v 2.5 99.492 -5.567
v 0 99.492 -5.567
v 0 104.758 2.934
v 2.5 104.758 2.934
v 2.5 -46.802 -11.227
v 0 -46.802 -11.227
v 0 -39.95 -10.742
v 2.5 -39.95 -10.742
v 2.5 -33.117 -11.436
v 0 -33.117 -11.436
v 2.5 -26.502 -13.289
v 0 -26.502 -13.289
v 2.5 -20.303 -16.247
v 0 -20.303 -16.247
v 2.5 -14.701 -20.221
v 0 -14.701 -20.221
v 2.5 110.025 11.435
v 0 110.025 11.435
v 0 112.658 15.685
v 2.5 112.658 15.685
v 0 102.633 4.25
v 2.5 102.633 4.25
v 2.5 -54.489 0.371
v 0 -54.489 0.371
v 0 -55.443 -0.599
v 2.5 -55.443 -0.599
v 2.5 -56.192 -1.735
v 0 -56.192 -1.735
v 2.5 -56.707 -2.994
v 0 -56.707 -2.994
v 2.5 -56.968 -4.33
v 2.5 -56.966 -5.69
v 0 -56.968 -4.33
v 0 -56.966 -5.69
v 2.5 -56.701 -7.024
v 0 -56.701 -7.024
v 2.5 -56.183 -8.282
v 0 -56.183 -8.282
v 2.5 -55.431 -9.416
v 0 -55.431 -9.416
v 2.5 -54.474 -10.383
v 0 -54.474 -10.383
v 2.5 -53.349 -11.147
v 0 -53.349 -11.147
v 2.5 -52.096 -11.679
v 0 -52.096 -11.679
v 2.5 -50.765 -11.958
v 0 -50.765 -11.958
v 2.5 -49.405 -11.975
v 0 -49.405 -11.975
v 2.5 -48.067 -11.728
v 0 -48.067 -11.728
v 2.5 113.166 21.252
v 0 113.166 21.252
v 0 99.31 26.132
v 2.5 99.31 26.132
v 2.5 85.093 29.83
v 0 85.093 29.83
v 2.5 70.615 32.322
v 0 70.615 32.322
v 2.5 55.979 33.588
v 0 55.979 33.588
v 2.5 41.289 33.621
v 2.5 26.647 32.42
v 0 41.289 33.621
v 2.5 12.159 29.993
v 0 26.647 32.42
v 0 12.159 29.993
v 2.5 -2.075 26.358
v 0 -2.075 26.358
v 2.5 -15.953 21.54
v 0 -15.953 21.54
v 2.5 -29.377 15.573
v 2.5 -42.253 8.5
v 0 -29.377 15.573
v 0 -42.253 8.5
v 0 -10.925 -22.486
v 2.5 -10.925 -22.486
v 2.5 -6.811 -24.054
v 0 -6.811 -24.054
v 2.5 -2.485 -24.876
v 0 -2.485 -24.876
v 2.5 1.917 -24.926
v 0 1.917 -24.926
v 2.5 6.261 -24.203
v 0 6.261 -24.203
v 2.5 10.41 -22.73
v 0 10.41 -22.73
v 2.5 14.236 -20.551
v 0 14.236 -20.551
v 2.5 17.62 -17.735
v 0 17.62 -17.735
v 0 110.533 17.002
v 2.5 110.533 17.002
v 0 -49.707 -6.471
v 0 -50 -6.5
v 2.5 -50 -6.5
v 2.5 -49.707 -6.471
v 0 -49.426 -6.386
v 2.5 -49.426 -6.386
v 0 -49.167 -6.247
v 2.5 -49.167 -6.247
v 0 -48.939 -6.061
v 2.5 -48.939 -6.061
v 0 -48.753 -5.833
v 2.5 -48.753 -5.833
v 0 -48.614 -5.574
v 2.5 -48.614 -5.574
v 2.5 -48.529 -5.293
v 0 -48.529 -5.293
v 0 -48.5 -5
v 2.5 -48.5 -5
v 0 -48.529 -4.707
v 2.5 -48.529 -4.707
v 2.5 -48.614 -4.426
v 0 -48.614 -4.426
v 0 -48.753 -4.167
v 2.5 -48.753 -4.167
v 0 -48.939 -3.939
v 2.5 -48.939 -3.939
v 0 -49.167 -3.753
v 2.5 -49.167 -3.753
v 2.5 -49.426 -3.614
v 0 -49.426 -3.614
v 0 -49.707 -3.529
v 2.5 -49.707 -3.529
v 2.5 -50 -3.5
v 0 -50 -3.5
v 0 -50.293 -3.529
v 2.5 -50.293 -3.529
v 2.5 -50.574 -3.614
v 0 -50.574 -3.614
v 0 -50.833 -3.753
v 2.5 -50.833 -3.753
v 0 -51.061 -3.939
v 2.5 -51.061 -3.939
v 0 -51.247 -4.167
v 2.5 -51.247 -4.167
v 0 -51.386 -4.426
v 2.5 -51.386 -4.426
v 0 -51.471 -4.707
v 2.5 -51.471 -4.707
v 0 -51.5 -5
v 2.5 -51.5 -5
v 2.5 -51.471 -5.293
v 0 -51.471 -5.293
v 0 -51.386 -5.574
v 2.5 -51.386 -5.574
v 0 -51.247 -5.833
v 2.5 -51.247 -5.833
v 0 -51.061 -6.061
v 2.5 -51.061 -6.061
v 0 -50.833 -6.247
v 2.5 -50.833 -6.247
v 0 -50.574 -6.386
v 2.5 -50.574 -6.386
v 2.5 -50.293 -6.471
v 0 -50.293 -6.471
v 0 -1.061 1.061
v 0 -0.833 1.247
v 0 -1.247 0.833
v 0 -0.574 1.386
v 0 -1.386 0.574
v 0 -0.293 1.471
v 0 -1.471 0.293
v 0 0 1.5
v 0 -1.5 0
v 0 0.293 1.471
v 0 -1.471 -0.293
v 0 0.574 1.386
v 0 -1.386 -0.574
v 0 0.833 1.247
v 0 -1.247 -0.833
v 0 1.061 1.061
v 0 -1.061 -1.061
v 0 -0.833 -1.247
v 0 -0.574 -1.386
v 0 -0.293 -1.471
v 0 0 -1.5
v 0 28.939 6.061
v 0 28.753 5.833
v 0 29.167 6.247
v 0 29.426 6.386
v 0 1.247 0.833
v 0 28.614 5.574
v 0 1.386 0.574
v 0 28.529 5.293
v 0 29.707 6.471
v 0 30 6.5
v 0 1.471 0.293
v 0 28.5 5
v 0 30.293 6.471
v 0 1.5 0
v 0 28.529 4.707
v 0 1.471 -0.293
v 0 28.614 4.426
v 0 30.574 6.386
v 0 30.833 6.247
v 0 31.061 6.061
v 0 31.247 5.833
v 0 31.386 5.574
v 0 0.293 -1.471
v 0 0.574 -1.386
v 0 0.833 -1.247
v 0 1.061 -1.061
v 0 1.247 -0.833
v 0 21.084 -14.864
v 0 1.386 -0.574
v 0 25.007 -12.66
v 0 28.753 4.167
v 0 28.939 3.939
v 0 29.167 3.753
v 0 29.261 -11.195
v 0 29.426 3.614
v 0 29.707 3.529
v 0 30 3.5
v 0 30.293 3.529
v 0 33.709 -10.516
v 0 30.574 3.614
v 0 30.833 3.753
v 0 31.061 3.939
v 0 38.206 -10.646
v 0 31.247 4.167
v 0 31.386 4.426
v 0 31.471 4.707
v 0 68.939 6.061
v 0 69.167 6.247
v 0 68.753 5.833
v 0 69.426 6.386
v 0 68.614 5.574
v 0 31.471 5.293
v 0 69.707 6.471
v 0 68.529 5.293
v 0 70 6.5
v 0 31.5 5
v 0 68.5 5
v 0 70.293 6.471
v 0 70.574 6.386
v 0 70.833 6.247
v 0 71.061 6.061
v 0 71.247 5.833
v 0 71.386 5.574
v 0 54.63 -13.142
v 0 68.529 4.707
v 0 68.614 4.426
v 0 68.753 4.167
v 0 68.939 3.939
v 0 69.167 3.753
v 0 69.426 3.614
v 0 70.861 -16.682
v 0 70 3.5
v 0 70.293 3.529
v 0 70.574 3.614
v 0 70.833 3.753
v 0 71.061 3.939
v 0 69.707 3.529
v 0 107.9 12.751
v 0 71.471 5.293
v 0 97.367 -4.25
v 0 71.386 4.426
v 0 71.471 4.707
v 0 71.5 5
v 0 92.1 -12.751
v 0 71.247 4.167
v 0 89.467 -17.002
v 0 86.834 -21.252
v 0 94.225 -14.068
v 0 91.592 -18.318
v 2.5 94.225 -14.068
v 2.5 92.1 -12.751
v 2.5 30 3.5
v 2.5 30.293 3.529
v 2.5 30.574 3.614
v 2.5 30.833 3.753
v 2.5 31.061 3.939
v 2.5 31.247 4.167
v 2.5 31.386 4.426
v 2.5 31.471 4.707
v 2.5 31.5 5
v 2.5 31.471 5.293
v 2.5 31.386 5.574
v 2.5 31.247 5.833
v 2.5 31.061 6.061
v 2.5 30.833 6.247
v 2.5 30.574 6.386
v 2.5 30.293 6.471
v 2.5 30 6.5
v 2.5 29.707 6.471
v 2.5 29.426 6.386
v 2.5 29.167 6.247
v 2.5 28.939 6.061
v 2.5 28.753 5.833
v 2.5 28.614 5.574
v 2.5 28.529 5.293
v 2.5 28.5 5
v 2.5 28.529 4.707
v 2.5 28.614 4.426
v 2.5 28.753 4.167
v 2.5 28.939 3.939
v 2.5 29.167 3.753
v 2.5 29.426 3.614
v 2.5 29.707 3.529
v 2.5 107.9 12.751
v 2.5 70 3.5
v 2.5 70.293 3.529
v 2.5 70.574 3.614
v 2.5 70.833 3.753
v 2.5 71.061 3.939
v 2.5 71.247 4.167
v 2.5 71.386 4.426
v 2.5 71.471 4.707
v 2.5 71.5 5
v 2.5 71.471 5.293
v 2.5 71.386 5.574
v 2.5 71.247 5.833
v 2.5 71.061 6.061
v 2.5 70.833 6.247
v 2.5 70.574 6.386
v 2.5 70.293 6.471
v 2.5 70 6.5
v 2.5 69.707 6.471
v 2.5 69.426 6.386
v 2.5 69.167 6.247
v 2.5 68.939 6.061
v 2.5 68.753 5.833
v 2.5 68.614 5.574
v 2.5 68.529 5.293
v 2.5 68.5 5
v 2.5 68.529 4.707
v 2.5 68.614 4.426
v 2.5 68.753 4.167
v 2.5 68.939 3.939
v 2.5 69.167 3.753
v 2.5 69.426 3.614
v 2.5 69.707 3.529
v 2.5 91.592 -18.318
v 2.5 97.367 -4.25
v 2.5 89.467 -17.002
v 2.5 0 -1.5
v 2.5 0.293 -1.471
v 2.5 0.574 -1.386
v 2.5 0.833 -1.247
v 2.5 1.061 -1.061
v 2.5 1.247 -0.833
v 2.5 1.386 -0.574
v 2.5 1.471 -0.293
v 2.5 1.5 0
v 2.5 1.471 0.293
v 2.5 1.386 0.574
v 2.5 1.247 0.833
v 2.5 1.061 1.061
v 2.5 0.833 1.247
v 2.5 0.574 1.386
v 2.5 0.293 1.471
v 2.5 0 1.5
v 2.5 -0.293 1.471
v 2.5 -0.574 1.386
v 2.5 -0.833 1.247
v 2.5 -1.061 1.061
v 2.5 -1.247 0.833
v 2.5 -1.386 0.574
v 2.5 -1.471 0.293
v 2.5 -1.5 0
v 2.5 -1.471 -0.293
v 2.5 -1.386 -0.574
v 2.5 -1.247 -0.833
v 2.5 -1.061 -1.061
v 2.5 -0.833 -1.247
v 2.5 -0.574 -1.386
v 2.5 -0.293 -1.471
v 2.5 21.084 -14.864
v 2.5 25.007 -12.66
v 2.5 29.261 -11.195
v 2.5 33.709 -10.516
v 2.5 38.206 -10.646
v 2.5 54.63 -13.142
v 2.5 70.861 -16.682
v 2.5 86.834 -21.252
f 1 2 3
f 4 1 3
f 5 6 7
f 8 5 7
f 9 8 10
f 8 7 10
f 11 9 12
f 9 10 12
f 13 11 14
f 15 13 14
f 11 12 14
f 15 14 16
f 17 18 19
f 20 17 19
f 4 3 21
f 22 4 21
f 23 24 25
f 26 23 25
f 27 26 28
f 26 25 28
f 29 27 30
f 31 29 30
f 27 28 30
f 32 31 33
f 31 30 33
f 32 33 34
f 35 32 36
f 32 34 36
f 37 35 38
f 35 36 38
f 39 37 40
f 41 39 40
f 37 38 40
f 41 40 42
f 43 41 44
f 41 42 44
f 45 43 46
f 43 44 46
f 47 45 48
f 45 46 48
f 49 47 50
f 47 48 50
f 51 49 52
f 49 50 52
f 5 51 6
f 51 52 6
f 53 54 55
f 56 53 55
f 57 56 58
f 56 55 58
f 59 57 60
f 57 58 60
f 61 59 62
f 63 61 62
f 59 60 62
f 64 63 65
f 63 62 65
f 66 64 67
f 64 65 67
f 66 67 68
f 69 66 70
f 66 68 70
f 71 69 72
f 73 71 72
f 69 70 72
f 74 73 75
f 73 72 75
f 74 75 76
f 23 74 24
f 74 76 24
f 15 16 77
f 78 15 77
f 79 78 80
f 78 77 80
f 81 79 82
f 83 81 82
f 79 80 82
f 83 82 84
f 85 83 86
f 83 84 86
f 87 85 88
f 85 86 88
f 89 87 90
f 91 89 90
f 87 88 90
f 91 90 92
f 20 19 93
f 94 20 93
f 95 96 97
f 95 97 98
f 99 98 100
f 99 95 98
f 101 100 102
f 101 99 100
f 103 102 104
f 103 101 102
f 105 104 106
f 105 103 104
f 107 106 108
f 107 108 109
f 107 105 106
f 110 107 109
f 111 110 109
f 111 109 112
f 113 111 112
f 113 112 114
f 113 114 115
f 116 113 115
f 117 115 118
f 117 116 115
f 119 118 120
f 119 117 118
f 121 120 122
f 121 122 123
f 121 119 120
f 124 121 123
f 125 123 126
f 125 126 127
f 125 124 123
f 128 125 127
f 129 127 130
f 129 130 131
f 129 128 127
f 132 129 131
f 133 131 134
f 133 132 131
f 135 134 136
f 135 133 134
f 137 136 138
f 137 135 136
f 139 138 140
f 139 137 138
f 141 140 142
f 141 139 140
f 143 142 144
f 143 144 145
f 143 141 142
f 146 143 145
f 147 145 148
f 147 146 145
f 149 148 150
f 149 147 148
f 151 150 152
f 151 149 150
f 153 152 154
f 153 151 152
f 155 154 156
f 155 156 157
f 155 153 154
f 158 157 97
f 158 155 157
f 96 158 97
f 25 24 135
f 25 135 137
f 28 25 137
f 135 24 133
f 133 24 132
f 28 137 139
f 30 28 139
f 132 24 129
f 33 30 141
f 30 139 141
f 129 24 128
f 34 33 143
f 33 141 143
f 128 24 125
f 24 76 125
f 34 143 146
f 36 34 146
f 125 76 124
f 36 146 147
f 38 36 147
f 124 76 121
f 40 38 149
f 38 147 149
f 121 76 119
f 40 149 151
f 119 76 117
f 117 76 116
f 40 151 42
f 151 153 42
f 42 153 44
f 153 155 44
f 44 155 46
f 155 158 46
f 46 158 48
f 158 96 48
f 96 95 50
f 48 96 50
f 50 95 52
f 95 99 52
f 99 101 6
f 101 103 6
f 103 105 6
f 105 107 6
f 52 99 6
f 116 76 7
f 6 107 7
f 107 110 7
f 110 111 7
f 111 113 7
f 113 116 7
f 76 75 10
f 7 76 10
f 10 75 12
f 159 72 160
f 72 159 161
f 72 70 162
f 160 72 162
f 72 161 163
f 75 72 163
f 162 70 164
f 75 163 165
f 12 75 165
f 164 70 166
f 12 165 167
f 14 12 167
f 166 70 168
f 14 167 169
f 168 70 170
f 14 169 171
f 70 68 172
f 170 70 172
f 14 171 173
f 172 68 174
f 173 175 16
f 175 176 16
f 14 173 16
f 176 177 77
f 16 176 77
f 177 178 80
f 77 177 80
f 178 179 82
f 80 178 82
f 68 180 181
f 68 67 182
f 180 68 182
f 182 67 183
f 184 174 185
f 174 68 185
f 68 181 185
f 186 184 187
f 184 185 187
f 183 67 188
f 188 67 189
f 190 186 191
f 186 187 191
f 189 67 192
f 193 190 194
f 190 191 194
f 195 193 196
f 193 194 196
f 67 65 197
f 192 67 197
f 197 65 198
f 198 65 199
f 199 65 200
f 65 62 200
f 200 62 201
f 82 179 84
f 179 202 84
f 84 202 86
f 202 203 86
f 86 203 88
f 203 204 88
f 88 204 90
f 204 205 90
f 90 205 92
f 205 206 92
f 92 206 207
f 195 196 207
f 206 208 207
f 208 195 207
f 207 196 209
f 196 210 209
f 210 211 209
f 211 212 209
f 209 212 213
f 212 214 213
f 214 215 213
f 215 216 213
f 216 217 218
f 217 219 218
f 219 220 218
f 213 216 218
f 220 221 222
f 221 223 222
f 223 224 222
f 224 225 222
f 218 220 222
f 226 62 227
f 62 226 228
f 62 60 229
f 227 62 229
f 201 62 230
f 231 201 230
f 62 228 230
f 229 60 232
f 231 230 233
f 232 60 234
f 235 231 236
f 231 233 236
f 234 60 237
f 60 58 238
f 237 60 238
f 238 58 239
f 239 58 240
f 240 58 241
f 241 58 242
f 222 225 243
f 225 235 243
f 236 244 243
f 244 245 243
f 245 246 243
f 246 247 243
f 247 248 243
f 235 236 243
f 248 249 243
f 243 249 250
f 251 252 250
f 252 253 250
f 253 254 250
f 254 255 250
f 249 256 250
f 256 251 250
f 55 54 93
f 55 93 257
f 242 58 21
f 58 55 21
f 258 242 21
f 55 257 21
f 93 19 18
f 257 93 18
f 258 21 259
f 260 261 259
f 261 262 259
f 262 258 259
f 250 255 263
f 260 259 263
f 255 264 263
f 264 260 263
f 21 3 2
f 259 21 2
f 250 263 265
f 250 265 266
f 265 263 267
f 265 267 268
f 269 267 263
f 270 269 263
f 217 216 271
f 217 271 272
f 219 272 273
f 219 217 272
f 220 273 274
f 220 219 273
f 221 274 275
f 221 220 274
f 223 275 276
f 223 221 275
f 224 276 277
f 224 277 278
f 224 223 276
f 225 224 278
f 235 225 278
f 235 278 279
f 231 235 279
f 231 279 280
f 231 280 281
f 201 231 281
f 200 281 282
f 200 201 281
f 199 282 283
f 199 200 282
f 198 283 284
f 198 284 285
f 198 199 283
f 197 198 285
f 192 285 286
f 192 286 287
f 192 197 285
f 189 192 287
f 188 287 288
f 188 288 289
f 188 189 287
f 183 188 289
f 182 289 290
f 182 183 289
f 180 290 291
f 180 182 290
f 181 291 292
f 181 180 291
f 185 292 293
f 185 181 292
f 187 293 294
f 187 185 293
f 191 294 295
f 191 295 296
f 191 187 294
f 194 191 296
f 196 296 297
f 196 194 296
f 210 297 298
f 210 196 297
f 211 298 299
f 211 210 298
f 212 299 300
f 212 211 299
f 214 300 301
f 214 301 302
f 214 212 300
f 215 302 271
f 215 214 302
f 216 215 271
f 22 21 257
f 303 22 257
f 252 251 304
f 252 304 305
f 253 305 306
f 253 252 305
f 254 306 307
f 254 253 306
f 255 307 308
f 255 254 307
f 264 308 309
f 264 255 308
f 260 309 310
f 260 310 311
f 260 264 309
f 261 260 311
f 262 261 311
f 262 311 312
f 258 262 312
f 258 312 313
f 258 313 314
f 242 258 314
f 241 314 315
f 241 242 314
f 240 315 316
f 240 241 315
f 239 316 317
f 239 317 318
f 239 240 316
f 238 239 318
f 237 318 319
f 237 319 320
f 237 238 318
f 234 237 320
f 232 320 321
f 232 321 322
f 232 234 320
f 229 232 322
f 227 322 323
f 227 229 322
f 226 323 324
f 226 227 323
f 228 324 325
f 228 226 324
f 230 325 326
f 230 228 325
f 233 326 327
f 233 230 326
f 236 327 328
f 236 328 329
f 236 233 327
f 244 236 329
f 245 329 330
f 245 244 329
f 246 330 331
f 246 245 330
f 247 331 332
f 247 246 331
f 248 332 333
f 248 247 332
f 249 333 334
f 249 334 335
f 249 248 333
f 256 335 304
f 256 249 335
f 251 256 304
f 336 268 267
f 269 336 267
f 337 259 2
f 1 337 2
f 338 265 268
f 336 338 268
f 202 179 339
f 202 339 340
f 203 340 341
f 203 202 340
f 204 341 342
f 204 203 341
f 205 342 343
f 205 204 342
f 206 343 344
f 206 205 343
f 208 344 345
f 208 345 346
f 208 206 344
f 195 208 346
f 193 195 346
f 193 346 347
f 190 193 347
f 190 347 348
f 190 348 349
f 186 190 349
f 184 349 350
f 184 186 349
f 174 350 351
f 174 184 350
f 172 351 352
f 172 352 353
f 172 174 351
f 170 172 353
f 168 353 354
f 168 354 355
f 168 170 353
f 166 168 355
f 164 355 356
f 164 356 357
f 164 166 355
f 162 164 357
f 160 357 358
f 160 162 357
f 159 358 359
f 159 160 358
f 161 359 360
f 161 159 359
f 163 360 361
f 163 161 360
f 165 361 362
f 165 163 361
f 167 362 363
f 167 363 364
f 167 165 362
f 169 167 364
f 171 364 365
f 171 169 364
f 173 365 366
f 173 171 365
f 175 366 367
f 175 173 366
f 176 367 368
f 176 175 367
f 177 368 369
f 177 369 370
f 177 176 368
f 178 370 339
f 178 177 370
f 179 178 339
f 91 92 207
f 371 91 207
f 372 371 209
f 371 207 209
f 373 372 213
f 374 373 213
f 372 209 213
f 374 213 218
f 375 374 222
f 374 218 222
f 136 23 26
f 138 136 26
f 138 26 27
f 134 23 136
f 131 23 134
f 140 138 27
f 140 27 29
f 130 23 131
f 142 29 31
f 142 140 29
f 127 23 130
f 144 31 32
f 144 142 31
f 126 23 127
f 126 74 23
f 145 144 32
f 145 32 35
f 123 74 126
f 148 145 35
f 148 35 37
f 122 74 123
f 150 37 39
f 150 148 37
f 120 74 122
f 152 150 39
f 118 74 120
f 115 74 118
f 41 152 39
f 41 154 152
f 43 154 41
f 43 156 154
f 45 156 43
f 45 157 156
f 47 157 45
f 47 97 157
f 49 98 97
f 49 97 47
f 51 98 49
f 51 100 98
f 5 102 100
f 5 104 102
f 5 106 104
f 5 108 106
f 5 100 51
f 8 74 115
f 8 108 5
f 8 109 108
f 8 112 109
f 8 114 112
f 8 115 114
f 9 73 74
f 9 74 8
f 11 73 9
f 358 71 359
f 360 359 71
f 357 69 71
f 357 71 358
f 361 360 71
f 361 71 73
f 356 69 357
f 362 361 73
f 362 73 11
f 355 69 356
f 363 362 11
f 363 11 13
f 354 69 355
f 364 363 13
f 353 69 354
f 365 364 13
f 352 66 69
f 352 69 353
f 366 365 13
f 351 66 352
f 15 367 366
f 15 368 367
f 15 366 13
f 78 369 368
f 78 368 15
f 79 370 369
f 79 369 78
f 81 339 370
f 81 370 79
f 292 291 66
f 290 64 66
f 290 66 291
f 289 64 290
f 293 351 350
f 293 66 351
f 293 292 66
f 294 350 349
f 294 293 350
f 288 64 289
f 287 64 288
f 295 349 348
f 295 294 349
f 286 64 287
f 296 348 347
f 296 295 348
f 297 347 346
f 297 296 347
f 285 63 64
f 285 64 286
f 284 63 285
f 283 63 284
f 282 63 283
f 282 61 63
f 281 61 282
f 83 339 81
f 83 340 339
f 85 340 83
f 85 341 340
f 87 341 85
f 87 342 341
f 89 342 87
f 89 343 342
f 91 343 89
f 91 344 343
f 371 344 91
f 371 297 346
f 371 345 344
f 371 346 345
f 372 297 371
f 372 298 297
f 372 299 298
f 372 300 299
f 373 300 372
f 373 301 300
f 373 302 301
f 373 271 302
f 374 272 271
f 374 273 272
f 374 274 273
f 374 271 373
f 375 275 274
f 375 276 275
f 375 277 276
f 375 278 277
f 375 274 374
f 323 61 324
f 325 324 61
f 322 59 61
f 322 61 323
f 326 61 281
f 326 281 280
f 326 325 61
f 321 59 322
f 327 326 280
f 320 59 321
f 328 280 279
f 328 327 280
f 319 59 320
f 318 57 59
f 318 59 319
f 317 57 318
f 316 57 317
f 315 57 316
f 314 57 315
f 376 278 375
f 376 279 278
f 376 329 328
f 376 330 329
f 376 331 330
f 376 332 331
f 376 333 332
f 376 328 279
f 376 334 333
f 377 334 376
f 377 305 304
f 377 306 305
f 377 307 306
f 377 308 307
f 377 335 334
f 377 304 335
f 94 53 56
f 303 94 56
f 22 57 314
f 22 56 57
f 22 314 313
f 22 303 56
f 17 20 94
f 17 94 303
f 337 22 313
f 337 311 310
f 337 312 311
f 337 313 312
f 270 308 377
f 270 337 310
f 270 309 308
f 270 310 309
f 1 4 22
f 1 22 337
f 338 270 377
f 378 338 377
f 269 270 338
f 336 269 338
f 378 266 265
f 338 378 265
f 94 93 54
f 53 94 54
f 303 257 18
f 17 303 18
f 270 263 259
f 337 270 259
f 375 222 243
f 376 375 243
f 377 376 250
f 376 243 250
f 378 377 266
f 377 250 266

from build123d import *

# Parameters (mm, degrees)
CROQUIS1_R              = 1.5
SALIENTE_EXTRUIR1_DEPTH = 2.5


with BuildPart() as part:
    # Croquis1 → Saliente-Extruir1 (new body)
    with BuildSketch(Plane(origin=(0, 0, 0), x_dir=(0, 0, -1), z_dir=(1, 0, 0))):
        with BuildLine():
            Line((21.251917537, 86.83352739), (17.00153403, 89.466821912))
            Line((17.00153403, 89.466821912), (18.318181291, 91.592013666))
            Line((18.318181291, 91.592013666), (14.067797783, 94.225308188))
            Line((14.067797783, 94.225308188), (12.751150522, 92.100116434))
            Line((12.751150522, 92.100116434), (4.250383507, 97.366705478))
            Line((4.250383507, 97.366705478), (5.567030768, 99.491897232))
            Line((5.567030768, 99.491897232), (-2.933736246, 104.758486276))
            Line((-2.933736246, 104.758486276), (-4.250383507, 102.633294522))
            Line((-4.250383507, 102.633294522), (-12.751150522, 107.899883566))
            Line((-12.751150522, 107.899883566), (-11.434503261, 110.02507532))
            Line((-11.434503261, 110.02507532), (-15.684886769, 112.658369842))
            Line((-15.684886769, 112.658369842), (-17.00153403, 110.533178088))
            Line((-17.00153403, 110.533178088), (-21.251917537, 113.16647261))
            ThreePointArc((-21.251917537, 113.16647261), (-32.419507908, 26.647274601), (-0.370758332, -54.489427017))
            ThreePointArc((-0.370758332, -54.489427017), (8.867523579, -55.834574652), (11.226722216, -46.801886424))
            ThreePointArc((11.226722216, -46.801886424), (12.220238585, -29.769593029), (20.221051617, -14.700648676))
            ThreePointArc((20.221051617, -14.700648676), (24.926355942, 1.917493015), (17.734708518, 17.620445902))
            ThreePointArc((17.734708518, 17.620445902), (11.831680909, 27.101025049), (10.645879945, 38.206023562))
            ThreePointArc((10.645879945, 38.206023562), (14.782652045, 62.774142971), (21.251917537, 86.83352739))
        make_face()
        with Locations((5, -50)):
            Circle(CROQUIS1_R, mode=Mode.SUBTRACT)
        Circle(CROQUIS1_R, mode=Mode.SUBTRACT)
        with Locations((-5, 30)):
            Circle(CROQUIS1_R, mode=Mode.SUBTRACT)
        with Locations((-5, 70)):
            Circle(CROQUIS1_R, mode=Mode.SUBTRACT)
    extrude(amount=SALIENTE_EXTRUIR1_DEPTH)


solid = part.part
